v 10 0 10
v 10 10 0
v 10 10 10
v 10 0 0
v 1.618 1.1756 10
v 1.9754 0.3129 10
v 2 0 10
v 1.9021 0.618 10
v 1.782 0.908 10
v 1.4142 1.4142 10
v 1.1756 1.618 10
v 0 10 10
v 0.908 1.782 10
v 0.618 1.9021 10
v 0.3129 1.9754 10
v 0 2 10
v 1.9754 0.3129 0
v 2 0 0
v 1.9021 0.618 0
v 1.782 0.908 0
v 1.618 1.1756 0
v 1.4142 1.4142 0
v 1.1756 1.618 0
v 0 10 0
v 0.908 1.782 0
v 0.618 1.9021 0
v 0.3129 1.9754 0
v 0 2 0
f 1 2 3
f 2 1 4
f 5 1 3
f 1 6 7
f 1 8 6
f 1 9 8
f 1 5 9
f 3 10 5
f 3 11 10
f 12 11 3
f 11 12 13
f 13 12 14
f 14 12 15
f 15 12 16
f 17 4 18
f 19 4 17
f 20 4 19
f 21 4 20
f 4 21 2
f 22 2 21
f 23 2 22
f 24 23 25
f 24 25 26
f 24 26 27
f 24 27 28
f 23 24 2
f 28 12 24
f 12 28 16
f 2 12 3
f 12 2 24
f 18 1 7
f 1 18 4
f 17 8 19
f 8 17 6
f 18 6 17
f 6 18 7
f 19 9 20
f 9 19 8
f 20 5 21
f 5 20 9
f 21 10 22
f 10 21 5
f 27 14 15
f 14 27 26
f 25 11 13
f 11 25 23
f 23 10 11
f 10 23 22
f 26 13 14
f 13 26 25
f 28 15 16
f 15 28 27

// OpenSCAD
//Author: Chris Correll
//Date: 10/13/2022
//Description: Lesson 2-2 Combing shapes with booleans differences

$fn = 40; 

//How to do a difference
difference() {
cube([10, 10, 10]);
cylinder(h=10,r=2);
}

//Take two holes out of a sphere, they can be anywhere as long as they are not overlapping and are fully cutting through the sphere

//Take two holes out of a cube, one in the middle and one touching the edge

//Make a box without a lid

//Make a cup

//Bonus parameterize your cup or box
